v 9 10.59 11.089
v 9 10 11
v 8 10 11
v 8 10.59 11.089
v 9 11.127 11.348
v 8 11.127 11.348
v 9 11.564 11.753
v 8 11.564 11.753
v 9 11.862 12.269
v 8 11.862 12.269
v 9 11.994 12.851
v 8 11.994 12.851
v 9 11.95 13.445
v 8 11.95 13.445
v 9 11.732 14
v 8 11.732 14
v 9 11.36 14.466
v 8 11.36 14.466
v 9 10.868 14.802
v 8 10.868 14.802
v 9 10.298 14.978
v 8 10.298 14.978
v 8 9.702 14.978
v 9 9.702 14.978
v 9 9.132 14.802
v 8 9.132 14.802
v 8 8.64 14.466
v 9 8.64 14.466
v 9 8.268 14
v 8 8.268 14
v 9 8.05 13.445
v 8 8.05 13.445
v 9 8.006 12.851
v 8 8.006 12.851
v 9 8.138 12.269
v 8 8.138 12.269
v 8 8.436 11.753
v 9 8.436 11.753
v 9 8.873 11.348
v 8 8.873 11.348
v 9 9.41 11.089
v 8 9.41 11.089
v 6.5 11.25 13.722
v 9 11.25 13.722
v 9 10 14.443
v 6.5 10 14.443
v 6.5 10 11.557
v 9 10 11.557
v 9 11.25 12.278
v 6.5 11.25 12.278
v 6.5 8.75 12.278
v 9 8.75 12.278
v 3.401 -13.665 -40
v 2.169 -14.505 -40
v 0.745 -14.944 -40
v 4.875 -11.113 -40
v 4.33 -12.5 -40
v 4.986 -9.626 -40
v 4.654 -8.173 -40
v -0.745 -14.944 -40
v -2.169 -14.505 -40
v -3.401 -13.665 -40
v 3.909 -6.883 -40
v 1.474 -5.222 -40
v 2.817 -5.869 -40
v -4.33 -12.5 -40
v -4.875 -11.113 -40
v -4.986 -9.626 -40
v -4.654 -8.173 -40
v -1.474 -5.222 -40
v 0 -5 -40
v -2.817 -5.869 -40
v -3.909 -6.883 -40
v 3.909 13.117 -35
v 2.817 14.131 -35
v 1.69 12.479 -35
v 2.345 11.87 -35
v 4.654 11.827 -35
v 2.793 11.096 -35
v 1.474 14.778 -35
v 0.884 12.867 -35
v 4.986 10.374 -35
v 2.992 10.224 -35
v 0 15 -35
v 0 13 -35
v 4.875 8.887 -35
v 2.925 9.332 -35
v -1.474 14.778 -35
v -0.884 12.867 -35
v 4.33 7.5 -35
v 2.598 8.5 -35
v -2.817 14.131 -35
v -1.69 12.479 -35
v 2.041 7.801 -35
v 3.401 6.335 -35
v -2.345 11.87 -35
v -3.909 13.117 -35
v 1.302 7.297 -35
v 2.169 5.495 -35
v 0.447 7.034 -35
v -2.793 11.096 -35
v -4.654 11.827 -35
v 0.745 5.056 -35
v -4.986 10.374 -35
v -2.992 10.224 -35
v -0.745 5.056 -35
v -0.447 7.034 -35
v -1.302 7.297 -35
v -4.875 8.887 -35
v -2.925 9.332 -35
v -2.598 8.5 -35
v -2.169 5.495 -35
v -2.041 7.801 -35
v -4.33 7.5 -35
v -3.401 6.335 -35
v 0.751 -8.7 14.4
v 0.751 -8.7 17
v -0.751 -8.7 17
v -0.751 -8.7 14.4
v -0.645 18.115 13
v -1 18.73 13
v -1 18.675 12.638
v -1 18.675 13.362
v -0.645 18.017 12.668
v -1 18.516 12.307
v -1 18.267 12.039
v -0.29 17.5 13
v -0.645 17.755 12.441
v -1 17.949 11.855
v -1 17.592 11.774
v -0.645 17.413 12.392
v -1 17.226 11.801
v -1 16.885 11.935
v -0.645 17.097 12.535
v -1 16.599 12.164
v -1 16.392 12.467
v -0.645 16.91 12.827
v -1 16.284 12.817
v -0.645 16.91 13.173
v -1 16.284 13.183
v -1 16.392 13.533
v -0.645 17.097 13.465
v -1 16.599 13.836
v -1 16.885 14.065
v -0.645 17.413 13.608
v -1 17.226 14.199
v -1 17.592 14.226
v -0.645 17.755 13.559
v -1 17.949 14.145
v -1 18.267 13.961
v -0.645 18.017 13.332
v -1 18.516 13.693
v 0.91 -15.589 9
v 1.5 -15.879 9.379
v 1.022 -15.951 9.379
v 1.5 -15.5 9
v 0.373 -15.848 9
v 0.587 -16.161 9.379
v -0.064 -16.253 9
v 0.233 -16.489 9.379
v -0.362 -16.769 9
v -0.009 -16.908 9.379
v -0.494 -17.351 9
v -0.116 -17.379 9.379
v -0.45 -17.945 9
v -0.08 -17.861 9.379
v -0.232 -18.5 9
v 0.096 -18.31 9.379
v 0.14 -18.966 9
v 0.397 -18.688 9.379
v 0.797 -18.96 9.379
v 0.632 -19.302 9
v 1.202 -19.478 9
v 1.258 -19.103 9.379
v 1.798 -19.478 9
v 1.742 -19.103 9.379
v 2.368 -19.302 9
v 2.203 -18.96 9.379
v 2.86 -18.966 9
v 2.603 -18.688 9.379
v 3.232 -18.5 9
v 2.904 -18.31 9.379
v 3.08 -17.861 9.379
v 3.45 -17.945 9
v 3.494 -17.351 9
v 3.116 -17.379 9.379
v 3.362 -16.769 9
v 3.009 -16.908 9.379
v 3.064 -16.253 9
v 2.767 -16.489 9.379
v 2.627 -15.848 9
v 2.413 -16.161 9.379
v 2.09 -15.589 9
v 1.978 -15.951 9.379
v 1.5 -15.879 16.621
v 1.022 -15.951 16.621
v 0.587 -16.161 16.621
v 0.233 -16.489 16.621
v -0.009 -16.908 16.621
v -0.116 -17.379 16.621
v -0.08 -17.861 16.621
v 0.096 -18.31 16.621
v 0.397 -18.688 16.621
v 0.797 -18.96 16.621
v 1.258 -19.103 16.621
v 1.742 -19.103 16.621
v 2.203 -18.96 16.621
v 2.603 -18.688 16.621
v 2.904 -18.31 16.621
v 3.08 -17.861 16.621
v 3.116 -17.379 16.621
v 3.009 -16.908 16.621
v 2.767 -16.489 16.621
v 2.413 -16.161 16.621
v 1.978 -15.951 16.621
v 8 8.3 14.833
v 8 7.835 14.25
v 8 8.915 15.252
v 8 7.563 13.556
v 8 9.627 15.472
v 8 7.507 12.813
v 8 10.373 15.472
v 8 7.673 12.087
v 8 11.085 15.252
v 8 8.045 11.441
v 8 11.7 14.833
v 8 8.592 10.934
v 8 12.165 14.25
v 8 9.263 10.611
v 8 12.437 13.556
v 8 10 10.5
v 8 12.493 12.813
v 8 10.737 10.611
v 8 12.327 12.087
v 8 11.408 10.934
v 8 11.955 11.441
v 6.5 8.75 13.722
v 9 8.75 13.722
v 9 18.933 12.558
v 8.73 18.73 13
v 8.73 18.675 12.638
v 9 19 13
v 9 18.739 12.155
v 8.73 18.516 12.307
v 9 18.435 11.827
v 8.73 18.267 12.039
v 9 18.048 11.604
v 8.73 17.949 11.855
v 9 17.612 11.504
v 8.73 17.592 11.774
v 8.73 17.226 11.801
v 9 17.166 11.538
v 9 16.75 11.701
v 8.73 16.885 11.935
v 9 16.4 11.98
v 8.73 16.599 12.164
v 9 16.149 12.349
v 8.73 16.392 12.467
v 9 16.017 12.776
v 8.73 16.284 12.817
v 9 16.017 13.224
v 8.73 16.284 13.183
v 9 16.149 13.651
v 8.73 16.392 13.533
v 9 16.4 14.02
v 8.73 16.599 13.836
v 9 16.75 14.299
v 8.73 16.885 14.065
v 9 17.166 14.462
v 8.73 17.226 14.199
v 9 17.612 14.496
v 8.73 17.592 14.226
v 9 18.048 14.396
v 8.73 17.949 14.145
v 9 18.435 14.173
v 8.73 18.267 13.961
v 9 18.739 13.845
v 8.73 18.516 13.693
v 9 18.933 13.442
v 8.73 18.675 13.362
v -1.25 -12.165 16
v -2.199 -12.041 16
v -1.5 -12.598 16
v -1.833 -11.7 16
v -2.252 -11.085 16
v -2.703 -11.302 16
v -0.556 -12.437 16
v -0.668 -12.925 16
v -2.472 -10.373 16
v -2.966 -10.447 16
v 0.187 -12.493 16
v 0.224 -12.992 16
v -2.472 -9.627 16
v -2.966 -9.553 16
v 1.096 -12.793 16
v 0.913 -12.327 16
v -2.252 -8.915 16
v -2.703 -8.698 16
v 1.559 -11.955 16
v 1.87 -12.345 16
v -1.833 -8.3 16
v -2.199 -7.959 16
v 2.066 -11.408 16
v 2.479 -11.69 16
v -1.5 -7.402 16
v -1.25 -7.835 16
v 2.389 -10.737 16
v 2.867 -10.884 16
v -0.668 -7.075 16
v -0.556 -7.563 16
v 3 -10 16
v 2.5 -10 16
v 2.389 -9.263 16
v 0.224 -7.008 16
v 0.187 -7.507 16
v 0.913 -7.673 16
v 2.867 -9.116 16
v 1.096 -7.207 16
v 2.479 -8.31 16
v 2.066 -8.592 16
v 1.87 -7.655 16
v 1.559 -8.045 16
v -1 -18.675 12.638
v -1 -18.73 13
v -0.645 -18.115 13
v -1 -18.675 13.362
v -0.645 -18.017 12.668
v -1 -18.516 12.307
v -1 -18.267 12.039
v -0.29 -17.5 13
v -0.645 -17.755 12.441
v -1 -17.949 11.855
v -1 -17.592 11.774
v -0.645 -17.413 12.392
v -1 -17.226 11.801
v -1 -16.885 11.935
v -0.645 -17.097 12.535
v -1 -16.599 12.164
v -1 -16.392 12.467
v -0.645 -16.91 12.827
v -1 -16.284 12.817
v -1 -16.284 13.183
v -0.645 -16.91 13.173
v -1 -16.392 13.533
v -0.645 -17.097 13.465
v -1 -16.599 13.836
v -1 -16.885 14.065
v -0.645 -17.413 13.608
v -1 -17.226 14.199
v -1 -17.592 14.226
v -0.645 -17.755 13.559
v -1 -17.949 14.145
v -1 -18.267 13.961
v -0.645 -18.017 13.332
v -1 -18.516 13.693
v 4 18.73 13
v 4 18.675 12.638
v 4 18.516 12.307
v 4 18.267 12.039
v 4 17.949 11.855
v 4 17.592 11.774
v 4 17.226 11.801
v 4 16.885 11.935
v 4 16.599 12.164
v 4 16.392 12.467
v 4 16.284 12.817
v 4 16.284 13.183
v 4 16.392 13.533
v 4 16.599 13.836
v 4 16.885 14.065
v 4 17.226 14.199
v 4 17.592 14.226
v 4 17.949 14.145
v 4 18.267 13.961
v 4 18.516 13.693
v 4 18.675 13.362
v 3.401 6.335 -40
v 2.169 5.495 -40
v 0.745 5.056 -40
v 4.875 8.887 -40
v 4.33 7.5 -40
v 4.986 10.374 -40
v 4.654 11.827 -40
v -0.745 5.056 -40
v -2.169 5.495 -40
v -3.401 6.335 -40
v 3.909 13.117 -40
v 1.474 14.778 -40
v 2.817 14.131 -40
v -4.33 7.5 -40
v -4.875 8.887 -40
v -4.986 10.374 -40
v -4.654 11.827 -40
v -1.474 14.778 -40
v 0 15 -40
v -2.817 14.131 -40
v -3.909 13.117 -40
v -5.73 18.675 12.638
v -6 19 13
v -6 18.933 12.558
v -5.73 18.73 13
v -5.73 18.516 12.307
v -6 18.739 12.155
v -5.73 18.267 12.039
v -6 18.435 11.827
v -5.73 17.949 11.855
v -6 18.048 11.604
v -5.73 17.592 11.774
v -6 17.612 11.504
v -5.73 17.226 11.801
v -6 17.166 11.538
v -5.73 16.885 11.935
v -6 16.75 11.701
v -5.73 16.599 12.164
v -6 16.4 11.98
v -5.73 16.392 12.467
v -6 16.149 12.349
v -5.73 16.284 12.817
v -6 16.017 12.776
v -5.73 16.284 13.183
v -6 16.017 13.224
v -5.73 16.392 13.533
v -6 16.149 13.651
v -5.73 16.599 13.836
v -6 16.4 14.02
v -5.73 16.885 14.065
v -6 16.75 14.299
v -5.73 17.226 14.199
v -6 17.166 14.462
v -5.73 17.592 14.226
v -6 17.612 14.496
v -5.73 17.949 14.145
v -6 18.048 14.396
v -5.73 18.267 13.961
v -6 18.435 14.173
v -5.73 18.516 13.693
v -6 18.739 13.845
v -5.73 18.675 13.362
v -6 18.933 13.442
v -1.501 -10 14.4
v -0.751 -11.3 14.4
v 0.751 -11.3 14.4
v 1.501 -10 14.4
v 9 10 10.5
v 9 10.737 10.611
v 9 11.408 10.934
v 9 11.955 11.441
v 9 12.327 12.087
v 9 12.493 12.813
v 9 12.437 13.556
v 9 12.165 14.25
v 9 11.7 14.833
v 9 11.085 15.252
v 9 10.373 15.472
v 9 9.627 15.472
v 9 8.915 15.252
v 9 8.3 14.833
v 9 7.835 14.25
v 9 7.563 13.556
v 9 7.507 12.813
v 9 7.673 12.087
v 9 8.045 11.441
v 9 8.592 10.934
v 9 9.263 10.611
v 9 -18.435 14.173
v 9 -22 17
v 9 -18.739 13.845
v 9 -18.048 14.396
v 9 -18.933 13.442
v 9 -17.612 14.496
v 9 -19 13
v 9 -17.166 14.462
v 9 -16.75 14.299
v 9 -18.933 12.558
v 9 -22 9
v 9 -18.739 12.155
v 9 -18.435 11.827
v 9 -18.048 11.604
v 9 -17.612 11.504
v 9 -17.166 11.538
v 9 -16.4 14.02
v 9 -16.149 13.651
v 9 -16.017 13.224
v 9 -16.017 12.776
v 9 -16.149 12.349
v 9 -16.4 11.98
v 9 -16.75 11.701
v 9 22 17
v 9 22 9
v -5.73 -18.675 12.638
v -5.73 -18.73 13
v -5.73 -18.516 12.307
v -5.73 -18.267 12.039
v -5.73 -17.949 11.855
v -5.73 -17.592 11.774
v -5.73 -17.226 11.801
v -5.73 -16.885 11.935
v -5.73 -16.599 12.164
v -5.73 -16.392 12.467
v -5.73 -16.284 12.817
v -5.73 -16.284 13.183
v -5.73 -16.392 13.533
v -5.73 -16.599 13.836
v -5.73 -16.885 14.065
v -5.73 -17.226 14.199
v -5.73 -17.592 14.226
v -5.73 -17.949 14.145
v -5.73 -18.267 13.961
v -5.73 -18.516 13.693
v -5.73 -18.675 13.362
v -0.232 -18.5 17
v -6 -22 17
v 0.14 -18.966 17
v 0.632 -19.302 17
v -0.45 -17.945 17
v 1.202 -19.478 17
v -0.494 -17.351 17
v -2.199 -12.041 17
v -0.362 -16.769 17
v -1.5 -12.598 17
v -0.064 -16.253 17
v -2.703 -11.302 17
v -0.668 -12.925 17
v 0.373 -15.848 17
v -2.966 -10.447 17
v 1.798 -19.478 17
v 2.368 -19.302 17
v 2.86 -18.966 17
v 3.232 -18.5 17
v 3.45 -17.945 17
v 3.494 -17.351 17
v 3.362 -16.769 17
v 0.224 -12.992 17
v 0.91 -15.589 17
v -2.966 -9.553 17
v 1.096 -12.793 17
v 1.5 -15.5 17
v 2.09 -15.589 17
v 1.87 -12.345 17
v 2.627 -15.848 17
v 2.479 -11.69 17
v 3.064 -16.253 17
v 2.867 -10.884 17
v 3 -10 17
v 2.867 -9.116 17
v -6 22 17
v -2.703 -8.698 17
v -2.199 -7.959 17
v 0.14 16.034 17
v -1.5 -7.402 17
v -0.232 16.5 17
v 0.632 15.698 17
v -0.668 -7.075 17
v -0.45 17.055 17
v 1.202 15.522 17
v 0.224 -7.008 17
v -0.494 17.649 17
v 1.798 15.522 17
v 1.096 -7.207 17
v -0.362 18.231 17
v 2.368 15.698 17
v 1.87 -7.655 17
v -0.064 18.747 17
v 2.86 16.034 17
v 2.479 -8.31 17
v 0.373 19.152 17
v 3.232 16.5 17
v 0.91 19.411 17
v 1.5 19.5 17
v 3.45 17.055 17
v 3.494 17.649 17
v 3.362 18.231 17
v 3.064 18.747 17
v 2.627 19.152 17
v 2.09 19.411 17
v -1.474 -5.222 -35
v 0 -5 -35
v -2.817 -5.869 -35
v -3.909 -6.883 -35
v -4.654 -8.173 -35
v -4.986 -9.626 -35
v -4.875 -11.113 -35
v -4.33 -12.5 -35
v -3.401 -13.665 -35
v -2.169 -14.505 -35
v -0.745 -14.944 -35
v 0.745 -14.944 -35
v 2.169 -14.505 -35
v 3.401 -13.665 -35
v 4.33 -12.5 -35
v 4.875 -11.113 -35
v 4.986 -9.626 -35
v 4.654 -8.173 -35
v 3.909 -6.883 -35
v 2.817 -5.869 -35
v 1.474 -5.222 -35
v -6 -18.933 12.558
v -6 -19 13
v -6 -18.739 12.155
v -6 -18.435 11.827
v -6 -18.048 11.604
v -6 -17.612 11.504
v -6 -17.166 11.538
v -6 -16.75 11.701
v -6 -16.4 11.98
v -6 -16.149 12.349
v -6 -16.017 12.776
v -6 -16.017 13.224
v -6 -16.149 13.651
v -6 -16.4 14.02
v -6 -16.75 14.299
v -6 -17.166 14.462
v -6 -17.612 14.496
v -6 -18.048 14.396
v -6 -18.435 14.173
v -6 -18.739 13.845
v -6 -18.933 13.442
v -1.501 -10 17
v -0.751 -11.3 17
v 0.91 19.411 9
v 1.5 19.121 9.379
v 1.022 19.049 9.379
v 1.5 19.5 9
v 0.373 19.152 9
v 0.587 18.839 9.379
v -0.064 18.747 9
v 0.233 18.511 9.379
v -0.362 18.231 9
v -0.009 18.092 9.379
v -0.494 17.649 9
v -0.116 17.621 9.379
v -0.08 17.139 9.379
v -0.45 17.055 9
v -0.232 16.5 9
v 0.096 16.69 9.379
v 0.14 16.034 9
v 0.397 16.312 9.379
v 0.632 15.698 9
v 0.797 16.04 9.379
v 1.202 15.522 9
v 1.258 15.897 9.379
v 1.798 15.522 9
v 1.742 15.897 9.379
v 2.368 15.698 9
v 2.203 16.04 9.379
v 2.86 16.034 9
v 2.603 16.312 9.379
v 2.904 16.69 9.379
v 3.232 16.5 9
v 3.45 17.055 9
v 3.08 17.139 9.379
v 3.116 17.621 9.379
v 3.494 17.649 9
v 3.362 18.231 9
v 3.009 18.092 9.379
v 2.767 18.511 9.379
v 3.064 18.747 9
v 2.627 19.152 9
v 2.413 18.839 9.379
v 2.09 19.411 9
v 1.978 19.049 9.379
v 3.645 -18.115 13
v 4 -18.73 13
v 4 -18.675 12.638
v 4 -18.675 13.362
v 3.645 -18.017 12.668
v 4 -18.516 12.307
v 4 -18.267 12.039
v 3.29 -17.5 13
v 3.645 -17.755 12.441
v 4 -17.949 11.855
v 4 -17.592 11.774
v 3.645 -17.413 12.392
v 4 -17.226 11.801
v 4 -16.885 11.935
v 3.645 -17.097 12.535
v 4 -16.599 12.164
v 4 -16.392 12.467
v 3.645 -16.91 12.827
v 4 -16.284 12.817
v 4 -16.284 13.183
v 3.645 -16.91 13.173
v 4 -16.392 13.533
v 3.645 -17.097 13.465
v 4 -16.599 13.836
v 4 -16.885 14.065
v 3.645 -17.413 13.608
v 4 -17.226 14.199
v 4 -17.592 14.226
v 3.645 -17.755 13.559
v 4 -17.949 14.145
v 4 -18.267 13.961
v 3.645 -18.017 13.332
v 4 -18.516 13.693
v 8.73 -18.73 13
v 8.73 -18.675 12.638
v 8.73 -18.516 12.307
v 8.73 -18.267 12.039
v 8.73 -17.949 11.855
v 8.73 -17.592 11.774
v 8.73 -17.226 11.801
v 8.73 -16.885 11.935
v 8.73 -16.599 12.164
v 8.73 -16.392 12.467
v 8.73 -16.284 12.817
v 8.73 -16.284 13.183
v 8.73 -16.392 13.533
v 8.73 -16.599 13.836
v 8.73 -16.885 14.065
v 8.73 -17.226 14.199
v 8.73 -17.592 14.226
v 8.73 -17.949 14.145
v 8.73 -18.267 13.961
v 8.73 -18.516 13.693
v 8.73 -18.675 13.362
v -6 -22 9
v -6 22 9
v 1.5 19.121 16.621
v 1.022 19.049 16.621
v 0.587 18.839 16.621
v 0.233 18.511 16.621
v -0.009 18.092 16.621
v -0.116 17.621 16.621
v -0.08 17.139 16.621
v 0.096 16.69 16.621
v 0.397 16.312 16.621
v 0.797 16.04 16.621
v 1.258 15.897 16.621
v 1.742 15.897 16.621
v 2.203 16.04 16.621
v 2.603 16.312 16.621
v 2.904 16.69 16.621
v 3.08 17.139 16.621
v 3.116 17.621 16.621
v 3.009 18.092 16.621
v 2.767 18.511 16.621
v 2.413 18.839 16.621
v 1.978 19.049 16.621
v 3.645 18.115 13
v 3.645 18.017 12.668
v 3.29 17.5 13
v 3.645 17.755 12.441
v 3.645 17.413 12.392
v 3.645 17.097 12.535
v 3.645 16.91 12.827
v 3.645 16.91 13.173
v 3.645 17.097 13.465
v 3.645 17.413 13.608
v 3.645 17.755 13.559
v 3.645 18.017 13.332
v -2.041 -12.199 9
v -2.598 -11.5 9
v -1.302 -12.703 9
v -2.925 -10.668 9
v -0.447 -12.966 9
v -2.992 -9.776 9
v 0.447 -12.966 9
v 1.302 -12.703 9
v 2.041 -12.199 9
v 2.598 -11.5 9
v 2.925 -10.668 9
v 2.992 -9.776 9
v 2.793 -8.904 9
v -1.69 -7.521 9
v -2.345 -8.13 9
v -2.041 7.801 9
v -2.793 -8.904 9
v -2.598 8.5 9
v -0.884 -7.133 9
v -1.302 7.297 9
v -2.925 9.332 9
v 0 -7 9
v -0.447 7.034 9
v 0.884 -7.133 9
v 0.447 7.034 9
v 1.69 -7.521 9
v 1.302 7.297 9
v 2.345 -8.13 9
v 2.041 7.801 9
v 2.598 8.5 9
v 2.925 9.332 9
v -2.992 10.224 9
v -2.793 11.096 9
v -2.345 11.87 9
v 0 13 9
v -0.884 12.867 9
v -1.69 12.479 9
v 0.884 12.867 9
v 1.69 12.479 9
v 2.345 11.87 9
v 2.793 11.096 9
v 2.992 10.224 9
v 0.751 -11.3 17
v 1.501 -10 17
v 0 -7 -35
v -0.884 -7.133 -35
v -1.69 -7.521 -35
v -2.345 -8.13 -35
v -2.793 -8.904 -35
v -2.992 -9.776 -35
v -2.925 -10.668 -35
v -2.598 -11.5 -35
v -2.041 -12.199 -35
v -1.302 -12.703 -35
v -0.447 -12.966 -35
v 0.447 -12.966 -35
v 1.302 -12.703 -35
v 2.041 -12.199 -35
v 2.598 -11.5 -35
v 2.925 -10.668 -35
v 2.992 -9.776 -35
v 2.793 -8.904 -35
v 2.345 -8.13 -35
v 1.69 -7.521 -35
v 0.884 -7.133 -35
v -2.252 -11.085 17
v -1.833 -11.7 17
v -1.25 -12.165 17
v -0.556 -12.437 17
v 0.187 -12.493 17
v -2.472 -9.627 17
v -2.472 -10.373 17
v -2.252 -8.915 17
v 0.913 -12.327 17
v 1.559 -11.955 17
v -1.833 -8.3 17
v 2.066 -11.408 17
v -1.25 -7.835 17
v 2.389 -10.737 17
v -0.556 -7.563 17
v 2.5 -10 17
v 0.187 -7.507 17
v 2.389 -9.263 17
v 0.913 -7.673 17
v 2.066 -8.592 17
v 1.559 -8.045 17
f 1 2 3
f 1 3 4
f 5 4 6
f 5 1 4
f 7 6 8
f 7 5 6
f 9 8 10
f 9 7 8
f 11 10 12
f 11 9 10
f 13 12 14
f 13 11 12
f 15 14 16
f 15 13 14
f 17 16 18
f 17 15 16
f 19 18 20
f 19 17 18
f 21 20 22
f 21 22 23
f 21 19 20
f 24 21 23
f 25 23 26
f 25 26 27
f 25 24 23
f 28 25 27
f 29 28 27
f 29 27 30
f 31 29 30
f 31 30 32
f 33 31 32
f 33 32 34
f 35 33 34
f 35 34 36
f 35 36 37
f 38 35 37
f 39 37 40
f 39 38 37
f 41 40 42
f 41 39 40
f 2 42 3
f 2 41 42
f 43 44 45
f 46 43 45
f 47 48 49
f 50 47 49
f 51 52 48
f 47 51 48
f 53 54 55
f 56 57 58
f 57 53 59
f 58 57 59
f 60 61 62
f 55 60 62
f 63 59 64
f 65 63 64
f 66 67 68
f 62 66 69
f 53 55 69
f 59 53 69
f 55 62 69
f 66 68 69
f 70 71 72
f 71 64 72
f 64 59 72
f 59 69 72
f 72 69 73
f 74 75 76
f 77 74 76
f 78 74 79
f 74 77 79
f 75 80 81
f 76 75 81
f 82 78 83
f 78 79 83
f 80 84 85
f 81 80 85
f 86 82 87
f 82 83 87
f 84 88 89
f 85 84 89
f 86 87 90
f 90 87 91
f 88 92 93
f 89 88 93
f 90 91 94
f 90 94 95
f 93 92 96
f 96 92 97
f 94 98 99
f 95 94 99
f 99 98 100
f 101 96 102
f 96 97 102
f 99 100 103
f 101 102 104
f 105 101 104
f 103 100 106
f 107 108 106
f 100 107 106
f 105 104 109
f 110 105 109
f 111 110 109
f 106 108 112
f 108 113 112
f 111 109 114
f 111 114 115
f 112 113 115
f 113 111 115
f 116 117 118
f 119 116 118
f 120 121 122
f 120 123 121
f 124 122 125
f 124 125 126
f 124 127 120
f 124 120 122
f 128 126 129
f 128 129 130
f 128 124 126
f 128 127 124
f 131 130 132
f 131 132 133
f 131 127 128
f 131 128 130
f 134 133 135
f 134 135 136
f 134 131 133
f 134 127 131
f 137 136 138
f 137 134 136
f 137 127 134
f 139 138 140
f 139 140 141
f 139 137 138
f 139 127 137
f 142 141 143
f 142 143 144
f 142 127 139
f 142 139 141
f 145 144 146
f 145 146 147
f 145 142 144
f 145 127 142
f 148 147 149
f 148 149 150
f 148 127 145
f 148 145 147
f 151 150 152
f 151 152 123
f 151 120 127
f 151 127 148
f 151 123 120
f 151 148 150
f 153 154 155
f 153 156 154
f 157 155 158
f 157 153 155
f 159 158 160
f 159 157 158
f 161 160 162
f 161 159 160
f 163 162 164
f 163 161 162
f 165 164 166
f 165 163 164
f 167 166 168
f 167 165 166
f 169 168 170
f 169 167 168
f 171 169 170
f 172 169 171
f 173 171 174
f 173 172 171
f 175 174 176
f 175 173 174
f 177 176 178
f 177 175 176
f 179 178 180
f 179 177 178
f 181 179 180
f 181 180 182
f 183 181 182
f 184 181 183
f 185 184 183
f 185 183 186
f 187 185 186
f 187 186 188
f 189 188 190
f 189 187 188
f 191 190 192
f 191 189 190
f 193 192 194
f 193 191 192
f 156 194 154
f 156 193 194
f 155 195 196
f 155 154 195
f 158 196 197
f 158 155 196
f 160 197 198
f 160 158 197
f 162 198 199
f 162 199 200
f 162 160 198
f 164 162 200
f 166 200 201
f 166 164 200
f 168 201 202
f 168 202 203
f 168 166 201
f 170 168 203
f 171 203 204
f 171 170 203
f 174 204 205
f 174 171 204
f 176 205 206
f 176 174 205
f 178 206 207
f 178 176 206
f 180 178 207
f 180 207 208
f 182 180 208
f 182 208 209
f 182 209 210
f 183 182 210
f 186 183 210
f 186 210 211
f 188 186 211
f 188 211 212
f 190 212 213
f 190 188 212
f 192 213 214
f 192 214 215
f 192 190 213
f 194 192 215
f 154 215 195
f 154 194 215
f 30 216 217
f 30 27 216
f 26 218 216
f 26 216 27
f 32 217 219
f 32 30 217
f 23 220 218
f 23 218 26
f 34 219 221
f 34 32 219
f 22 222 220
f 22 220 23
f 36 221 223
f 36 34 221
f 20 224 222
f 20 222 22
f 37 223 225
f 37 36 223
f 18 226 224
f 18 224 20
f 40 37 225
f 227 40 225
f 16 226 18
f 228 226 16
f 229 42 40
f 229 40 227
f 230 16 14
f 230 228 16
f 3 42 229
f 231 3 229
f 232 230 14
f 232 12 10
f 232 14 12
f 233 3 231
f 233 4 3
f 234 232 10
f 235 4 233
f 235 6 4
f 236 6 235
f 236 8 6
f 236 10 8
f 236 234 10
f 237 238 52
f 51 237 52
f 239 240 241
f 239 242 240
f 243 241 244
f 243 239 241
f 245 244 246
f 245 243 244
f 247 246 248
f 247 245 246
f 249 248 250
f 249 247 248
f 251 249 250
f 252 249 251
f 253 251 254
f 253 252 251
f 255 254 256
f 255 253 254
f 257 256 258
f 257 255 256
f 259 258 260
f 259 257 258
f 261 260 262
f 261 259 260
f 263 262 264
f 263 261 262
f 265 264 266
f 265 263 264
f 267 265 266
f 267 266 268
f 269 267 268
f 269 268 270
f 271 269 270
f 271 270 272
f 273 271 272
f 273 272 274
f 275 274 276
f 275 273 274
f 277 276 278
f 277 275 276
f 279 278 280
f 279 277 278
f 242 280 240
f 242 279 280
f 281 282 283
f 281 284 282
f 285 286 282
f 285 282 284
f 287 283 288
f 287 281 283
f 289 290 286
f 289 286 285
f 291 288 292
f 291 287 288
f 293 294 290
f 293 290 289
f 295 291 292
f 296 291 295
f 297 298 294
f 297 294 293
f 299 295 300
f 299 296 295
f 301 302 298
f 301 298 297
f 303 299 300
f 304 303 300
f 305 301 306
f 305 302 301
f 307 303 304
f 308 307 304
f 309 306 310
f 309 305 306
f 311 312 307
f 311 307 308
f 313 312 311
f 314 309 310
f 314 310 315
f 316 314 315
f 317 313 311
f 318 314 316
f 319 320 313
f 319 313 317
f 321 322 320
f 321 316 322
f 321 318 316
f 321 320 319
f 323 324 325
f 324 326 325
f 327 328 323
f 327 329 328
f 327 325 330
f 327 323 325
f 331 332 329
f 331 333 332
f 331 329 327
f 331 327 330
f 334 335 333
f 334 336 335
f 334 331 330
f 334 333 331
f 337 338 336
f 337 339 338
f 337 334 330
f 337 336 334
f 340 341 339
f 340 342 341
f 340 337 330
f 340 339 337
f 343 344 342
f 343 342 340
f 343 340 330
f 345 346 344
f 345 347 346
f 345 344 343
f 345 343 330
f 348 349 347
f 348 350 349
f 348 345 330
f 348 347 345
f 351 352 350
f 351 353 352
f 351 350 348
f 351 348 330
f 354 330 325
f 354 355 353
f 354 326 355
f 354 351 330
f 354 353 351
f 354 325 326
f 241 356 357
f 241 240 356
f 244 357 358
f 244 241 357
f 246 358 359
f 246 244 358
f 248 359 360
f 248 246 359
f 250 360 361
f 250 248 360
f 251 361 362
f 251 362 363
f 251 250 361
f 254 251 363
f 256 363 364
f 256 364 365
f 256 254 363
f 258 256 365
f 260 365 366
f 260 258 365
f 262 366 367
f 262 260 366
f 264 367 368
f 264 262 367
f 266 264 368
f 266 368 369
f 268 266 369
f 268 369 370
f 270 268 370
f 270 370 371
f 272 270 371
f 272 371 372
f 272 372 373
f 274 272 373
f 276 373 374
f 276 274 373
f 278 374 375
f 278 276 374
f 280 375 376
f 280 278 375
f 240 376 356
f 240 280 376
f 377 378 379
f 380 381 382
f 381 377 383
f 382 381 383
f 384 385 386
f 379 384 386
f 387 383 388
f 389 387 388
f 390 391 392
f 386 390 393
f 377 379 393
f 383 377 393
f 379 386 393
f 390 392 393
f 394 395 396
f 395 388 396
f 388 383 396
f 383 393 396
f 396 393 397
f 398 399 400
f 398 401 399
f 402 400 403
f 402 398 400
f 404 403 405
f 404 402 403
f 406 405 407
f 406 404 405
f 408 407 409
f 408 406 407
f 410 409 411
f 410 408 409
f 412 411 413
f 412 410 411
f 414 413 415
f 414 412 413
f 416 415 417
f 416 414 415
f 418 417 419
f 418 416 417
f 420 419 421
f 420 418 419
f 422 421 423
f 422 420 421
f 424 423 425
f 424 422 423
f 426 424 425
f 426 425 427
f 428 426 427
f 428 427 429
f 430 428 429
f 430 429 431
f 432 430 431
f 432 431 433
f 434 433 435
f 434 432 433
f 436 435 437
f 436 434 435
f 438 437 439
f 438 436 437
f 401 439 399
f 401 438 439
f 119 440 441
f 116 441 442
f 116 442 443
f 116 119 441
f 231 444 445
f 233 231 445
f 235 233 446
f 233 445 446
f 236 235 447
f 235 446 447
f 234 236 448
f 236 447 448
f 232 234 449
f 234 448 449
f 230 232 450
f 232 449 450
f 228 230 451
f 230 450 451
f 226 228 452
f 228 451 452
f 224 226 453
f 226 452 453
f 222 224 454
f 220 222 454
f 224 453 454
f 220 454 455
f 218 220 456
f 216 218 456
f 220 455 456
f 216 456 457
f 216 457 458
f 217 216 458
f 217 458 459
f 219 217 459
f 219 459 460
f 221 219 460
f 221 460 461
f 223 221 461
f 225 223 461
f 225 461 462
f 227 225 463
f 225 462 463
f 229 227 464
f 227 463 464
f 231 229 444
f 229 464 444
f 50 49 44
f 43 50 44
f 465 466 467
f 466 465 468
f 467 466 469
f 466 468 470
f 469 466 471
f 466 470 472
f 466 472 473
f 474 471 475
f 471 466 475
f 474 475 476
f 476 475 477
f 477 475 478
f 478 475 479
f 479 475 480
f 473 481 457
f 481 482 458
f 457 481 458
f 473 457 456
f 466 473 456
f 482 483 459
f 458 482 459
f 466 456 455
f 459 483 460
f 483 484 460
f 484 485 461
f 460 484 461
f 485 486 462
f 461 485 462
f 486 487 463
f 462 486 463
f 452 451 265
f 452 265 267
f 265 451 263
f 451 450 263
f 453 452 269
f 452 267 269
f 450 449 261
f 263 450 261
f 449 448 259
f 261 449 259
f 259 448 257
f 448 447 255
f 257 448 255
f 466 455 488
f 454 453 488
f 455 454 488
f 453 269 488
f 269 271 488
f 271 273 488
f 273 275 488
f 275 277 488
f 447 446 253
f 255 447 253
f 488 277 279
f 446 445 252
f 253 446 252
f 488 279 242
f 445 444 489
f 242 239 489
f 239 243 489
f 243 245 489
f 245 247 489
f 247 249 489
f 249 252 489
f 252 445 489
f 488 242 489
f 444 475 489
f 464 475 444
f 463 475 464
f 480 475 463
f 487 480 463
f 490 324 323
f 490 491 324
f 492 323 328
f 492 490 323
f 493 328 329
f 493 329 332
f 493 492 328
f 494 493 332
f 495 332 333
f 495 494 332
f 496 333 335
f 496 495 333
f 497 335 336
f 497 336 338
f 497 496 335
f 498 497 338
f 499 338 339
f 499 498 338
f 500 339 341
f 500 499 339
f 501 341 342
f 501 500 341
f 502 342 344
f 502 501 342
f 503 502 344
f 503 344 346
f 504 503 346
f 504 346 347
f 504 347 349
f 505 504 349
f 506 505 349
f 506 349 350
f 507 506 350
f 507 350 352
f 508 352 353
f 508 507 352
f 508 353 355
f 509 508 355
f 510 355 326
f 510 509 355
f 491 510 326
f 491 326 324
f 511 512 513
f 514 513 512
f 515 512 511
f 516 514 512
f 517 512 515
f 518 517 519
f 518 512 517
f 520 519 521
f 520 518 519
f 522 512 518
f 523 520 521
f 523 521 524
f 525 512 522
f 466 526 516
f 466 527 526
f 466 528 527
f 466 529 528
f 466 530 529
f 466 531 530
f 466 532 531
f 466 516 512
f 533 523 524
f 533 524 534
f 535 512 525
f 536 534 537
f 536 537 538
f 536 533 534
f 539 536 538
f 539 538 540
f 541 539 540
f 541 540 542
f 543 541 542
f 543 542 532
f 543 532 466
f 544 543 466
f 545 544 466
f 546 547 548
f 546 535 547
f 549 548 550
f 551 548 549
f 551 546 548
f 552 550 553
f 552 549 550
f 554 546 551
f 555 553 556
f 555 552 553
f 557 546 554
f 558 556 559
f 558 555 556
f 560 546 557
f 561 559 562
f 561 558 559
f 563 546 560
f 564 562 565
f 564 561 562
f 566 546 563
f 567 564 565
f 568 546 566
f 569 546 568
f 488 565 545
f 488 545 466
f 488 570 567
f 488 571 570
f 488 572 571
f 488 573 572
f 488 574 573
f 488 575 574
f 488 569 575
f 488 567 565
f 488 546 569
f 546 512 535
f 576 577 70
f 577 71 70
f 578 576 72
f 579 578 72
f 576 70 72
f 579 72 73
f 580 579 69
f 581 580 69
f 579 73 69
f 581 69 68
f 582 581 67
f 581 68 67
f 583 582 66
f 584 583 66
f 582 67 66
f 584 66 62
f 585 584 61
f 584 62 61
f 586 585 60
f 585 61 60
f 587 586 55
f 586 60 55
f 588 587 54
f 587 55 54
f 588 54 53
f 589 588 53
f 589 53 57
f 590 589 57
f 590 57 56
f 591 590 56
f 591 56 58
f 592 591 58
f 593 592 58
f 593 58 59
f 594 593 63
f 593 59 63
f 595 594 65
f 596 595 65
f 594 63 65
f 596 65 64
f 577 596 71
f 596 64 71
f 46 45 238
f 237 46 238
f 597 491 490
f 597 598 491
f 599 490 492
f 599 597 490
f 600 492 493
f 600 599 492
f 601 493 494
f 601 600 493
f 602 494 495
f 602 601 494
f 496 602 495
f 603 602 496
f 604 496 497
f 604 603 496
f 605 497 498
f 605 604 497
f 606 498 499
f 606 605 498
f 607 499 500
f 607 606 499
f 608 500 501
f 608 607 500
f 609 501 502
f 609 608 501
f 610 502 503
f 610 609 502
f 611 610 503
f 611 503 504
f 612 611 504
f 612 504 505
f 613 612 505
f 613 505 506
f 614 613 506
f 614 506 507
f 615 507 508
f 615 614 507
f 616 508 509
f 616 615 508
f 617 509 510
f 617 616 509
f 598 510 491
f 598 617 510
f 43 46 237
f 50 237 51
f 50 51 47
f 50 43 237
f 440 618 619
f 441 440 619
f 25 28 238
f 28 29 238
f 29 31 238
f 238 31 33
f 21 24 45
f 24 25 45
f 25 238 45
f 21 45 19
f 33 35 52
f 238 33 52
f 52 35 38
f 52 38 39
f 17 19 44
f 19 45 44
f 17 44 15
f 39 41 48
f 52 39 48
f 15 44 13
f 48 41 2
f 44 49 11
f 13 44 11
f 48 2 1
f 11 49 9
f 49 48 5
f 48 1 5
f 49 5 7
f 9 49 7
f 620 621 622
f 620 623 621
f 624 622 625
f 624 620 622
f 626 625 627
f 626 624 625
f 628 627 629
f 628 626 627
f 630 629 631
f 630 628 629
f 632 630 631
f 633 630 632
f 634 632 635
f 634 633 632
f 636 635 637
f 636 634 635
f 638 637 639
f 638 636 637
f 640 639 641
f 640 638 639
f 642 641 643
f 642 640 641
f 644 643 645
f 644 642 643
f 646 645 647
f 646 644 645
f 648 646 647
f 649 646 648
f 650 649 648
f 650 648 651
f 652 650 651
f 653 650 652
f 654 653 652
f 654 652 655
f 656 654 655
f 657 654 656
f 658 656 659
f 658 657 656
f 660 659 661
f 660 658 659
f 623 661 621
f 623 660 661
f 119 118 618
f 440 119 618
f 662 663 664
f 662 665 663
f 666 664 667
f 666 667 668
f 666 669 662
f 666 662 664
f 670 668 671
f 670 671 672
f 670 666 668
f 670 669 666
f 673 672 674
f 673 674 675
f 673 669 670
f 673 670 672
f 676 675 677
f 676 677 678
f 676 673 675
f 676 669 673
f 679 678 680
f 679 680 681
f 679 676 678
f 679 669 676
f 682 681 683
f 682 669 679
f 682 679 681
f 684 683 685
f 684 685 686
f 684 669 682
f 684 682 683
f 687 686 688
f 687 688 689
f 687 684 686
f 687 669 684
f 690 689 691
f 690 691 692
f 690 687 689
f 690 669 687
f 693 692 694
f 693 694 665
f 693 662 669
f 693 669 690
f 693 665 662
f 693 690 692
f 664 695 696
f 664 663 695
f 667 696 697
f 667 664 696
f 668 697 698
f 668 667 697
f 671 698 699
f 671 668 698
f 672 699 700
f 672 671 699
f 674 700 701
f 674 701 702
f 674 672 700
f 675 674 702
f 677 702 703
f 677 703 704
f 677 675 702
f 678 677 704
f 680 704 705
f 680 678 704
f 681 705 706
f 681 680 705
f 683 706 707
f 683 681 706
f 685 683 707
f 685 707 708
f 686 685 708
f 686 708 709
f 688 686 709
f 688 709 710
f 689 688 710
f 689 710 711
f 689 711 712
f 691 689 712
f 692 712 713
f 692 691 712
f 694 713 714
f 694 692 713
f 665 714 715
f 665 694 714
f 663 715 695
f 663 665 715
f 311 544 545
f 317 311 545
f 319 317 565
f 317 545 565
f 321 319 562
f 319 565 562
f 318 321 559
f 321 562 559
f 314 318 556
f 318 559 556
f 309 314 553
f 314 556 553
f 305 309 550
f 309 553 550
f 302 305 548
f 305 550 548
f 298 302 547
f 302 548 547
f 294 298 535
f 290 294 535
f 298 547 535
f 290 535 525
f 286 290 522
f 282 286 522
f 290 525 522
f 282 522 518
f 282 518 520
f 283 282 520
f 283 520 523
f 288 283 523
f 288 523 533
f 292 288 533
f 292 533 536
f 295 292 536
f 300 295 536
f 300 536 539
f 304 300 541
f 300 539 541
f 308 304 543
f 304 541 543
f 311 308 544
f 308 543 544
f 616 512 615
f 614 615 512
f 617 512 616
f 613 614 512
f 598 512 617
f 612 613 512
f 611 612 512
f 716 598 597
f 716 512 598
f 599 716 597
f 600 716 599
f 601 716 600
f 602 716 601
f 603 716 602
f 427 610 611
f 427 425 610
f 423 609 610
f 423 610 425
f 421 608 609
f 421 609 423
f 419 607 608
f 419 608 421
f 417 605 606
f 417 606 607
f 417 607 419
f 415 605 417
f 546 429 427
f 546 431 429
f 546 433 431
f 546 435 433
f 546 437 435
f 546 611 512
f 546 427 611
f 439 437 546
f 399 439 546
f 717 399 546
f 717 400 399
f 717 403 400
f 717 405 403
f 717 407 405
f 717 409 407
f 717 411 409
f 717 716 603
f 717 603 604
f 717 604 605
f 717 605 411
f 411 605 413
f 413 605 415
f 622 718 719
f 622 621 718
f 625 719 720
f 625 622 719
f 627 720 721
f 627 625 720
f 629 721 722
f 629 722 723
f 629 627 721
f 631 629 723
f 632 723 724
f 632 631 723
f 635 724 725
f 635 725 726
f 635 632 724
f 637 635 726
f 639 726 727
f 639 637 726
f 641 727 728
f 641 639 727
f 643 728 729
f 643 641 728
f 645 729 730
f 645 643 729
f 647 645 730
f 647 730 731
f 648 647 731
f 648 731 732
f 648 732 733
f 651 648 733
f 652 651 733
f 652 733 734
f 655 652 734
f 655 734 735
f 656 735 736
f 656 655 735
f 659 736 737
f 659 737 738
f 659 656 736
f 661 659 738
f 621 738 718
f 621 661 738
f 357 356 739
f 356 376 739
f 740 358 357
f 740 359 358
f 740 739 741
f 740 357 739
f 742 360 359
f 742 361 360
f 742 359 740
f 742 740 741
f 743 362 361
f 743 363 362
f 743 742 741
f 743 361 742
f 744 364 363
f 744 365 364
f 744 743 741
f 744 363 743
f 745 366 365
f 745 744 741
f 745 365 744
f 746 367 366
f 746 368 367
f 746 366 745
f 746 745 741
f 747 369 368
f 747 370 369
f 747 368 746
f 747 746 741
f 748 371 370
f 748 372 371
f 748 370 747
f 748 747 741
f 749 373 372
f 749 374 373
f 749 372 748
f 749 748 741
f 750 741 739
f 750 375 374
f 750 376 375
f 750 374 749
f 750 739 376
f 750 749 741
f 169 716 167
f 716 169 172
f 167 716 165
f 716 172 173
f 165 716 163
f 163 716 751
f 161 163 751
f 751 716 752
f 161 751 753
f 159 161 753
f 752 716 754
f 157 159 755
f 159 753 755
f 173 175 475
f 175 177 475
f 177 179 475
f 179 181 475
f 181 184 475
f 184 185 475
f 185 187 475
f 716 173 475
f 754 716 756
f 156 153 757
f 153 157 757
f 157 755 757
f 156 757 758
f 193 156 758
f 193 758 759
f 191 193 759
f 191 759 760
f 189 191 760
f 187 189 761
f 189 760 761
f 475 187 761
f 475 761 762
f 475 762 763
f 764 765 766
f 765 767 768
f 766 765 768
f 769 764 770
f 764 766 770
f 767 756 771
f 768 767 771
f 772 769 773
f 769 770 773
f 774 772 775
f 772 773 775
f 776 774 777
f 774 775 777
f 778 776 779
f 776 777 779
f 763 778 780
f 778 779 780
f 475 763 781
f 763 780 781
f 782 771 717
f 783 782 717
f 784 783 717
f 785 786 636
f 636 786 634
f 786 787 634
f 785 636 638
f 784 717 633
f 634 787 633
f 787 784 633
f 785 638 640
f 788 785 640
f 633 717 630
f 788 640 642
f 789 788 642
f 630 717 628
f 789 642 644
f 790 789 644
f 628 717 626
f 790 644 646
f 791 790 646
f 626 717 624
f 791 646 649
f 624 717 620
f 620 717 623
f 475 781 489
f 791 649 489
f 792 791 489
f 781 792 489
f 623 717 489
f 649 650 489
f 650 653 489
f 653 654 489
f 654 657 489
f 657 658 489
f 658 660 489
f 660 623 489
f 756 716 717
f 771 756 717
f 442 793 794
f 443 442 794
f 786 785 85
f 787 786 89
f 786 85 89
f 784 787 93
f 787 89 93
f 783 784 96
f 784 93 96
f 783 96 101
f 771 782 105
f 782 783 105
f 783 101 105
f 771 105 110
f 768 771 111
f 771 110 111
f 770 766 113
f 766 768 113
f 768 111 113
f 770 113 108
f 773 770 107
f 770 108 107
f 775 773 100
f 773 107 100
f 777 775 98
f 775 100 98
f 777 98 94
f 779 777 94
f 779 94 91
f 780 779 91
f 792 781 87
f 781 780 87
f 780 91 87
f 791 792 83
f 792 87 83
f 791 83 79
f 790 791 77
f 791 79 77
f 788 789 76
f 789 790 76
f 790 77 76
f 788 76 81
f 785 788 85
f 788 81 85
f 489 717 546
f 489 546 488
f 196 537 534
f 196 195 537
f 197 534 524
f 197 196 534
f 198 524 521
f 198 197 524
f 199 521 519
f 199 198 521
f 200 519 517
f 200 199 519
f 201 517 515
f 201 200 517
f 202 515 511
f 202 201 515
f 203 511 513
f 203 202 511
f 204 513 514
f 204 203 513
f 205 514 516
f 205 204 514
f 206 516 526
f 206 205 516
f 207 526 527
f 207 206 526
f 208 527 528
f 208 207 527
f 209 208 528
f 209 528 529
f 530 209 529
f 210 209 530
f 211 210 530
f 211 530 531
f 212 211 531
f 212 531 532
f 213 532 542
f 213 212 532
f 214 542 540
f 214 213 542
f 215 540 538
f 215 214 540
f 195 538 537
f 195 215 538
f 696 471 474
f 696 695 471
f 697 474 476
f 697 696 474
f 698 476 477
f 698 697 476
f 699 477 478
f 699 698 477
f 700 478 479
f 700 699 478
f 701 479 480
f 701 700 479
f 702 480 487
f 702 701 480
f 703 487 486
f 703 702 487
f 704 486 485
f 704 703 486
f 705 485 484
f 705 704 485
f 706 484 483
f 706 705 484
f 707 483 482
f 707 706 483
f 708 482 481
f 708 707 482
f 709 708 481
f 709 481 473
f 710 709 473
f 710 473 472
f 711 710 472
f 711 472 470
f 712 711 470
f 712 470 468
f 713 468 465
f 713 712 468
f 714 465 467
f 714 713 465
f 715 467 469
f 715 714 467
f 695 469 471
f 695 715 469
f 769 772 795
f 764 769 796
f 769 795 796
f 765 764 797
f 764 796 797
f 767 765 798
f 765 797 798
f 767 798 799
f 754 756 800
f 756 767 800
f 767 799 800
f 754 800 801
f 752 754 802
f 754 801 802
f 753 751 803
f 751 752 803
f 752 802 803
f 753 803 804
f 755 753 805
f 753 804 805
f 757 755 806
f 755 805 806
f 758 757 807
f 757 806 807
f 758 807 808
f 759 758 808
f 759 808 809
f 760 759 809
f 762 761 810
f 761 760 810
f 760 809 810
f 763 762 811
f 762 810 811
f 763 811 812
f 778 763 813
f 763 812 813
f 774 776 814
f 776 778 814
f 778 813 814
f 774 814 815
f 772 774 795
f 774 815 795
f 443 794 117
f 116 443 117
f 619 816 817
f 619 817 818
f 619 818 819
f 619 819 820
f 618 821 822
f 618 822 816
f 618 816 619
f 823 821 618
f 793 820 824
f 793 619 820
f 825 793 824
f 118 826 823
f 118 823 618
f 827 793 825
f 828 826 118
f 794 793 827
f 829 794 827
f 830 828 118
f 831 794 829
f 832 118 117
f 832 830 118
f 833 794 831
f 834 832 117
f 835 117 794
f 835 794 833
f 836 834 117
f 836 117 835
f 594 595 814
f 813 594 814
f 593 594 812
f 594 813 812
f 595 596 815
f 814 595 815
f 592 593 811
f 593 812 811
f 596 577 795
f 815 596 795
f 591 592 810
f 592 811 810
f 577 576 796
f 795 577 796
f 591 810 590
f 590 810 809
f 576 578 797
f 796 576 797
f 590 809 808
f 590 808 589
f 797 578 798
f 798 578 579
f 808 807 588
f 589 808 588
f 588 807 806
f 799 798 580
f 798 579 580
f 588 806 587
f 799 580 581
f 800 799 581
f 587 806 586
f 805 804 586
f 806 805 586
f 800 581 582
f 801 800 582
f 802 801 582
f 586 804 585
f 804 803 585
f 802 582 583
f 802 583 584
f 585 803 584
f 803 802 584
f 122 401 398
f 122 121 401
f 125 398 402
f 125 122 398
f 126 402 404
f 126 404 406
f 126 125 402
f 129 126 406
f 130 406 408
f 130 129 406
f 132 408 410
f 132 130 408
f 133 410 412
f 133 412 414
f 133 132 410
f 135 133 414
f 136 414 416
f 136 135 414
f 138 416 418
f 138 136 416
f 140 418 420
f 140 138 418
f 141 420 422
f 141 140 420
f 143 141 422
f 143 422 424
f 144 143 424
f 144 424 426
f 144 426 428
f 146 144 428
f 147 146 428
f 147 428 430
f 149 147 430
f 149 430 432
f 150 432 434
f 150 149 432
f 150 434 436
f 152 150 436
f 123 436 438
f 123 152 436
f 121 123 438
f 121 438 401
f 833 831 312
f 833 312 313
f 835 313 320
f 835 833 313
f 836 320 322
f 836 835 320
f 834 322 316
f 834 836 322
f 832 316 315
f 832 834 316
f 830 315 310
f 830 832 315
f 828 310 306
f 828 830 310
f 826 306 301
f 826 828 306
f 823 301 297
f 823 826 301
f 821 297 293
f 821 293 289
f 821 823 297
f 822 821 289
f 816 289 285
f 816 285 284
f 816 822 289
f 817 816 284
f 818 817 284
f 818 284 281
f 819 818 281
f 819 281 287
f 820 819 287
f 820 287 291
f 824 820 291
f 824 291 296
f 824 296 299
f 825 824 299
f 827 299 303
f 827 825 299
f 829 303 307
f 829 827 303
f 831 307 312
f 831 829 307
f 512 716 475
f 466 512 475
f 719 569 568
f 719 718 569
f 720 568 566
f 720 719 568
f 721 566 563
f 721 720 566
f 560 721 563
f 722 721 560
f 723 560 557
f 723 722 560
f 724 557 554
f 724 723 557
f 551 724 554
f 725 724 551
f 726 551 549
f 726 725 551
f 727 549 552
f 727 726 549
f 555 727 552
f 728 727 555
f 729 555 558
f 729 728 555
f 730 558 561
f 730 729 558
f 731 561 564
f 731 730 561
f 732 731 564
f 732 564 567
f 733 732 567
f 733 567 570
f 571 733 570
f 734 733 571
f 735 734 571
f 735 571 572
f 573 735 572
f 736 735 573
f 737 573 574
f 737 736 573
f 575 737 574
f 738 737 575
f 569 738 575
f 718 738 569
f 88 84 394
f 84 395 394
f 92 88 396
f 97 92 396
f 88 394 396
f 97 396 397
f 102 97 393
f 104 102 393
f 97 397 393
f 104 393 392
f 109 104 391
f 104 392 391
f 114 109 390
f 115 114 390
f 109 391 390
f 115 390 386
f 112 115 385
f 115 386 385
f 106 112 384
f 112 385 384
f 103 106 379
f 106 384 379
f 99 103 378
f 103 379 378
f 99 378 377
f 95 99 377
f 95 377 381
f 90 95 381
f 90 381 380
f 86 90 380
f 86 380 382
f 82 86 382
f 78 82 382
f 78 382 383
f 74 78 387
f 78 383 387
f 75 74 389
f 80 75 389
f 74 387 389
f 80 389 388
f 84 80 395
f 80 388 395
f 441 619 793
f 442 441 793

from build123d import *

# Parameters (mm, degrees)
SKETCH_1_W          = 15
SKETCH_1_H          = 44
EXTRUDE_1_DEPTH     = 8
CUT_EXTRUDE_START   = -1
SKETCH_10_R         = 3
SKETCH_10_R_2       = 2.5
CUT_EXTRUDE_1_DEPTH = 1
CUT_EXTRUDE_2_DEPTH = 2.6
SKETCH_12_R         = 2.5
SKETCH_12_R_2       = 2
CUT_EXTRUDE_3_DEPTH = 1
CUT_EXTRUDE_4_DEPTH = 2.5


with BuildPart() as part:
    # 草图1 → 凸台-拉伸1 (new body)
    with BuildSketch(Plane.XY.offset(9)):
        with Locations((1.5, 0)):
            Rectangle(SKETCH_1_W, SKETCH_1_H)
    extrude(amount=EXTRUDE_1_DEPTH)

    # 草图2 → 旋转1 (revolve)
    with BuildSketch(Plane(origin=(0, 0, 0), x_dir=(0, 0, -1), z_dir=(1, 0, 0))):
        Polygon((-14, 10), (-14, 13), (35, 13), (35, 15), (40, 15), (40, 10), align=None)
    revolve(axis=Axis((0, 10, -40), (0, 0, 1)))

    # 草图3 → 旋转2 (revolve)
    with BuildSketch(Plane(origin=(0, 0, 0), x_dir=(0, 0, -1), z_dir=(1, 0, 0))):
        Polygon((-14, -10), (-14, -7), (35, -7), (35, -5), (40, -5), (40, -10), align=None)
    revolve(axis=Axis((0, -10, -40), (0, 0, 1)))

    # 草图4 → 切除-旋转1 (revolve, cut)
    with BuildSketch(Plane(origin=(1.5, 0, 0), x_dir=(0, 0, -1), z_dir=(1, 0, 0))):
        Polygon((-17, 17.5), (-17, 19.5), (-16.621, 19.121), (-9.379, 19.121), (-9, 19.5), (-9, 17.5), align=None)
    revolve(axis=Axis((1.5, 17.5, 9), (0, 0, 1)), mode=Mode.SUBTRACT)

    # 草图5 → 切除-旋转2 (revolve, cut)
    with BuildSketch(Plane(origin=(1.5, 0, 0), x_dir=(0, 0, -1), z_dir=(1, 0, 0))):
        Polygon((-17, -17.5), (-17, -15.5), (-16.621, -15.879), (-9.379, -15.879), (-9, -15.5), (-9, -17.5), align=None)
    revolve(axis=Axis((1.5, -17.5, 9), (0, 0, 1)), mode=Mode.SUBTRACT)

    # 草图6 → 切除-旋转3 (revolve, cut)
    with BuildSketch(Plane.XY.offset(13)):
        Polygon((-6, 17.5), (-6, 19), (-5.7295, 18.7295), (-1, 18.7295), (-0.290147844, 17.5), align=None)
    revolve(axis=Axis((-0.290147844, 17.5, 13), (-1, 0, 0)), mode=Mode.SUBTRACT)

    # 草图7 → 切除-旋转4 (revolve, cut)
    with BuildSketch(Plane.XY.offset(13)):
        Polygon((-0.290147844, -17.5), (-1, -18.7295), (-5.7295, -18.7295), (-6, -19), (-6, -17.5), align=None)
    revolve(axis=Axis((-6, -17.5, 13), (1, 0, 0)), mode=Mode.SUBTRACT)

    # 草图8 → 切除-旋转5 (revolve, cut)
    with BuildSketch(Plane.XY.offset(13)):
        Polygon((3.290147844, 17.5), (4, 18.7295), (8.7295, 18.7295), (9, 19), (9, 17.5), align=None)
    revolve(axis=Axis((9, 17.5, 13), (-1, 0, 0)), mode=Mode.SUBTRACT)

    # 草图9 → 切除-旋转6 (revolve, cut)
    with BuildSketch(Plane.XY.offset(13)):
        Polygon((9, -17.5), (9, -19), (8.7295, -18.7295), (4, -18.7295), (3.290147844, -17.5), align=None)
    revolve(axis=Axis((3.290147844, -17.5, 13), (1, 0, 0)), mode=Mode.SUBTRACT)

    # 草图10 → 切除-拉伸1 (cut)
    with BuildSketch(Plane.XY.offset(17).offset(CUT_EXTRUDE_START)):
        with Locations((0, -10)):
            Circle(SKETCH_10_R)
        with Locations((0, -10)):
            Circle(SKETCH_10_R_2, mode=Mode.SUBTRACT)
    extrude(amount=CUT_EXTRUDE_1_DEPTH, mode=Mode.SUBTRACT)

    # 草图11 → 切除-拉伸2 (cut)
    with BuildSketch(Plane.XY.offset(17)):
        Polygon((-1.5011107, -10), (-0.75055535, -11.3), (0.75055535, -11.3), (1.5011107, -10), (0.75055535, -8.7), (-0.75055535, -8.7), align=None)
    extrude(amount=-CUT_EXTRUDE_2_DEPTH, mode=Mode.SUBTRACT)

    # 草图12 → 切除-拉伸3 (cut)
    with BuildSketch(Plane(origin=(9, 0, 0), x_dir=(0, 0, -1), z_dir=(1, 0, 0))):
        with Locations((-13, 10)):
            Circle(SKETCH_12_R)
        with Locations((-13, 10)):
            Circle(SKETCH_12_R_2, mode=Mode.SUBTRACT)
    extrude(amount=-CUT_EXTRUDE_3_DEPTH, mode=Mode.SUBTRACT)

    # 草图13 → 切除-拉伸4 (cut)
    with BuildSketch(Plane(origin=(9, 0, 0), x_dir=(0, 0, -1), z_dir=(1, 0, 0))):
        Polygon((-14.443375673, 10), (-13.721687836, 8.75), (-12.278312164, 8.75), (-11.556624327, 10), (-12.278312164, 11.25), (-13.721687836, 11.25), align=None)
    extrude(amount=-CUT_EXTRUDE_4_DEPTH, mode=Mode.SUBTRACT)


solid = part.part
